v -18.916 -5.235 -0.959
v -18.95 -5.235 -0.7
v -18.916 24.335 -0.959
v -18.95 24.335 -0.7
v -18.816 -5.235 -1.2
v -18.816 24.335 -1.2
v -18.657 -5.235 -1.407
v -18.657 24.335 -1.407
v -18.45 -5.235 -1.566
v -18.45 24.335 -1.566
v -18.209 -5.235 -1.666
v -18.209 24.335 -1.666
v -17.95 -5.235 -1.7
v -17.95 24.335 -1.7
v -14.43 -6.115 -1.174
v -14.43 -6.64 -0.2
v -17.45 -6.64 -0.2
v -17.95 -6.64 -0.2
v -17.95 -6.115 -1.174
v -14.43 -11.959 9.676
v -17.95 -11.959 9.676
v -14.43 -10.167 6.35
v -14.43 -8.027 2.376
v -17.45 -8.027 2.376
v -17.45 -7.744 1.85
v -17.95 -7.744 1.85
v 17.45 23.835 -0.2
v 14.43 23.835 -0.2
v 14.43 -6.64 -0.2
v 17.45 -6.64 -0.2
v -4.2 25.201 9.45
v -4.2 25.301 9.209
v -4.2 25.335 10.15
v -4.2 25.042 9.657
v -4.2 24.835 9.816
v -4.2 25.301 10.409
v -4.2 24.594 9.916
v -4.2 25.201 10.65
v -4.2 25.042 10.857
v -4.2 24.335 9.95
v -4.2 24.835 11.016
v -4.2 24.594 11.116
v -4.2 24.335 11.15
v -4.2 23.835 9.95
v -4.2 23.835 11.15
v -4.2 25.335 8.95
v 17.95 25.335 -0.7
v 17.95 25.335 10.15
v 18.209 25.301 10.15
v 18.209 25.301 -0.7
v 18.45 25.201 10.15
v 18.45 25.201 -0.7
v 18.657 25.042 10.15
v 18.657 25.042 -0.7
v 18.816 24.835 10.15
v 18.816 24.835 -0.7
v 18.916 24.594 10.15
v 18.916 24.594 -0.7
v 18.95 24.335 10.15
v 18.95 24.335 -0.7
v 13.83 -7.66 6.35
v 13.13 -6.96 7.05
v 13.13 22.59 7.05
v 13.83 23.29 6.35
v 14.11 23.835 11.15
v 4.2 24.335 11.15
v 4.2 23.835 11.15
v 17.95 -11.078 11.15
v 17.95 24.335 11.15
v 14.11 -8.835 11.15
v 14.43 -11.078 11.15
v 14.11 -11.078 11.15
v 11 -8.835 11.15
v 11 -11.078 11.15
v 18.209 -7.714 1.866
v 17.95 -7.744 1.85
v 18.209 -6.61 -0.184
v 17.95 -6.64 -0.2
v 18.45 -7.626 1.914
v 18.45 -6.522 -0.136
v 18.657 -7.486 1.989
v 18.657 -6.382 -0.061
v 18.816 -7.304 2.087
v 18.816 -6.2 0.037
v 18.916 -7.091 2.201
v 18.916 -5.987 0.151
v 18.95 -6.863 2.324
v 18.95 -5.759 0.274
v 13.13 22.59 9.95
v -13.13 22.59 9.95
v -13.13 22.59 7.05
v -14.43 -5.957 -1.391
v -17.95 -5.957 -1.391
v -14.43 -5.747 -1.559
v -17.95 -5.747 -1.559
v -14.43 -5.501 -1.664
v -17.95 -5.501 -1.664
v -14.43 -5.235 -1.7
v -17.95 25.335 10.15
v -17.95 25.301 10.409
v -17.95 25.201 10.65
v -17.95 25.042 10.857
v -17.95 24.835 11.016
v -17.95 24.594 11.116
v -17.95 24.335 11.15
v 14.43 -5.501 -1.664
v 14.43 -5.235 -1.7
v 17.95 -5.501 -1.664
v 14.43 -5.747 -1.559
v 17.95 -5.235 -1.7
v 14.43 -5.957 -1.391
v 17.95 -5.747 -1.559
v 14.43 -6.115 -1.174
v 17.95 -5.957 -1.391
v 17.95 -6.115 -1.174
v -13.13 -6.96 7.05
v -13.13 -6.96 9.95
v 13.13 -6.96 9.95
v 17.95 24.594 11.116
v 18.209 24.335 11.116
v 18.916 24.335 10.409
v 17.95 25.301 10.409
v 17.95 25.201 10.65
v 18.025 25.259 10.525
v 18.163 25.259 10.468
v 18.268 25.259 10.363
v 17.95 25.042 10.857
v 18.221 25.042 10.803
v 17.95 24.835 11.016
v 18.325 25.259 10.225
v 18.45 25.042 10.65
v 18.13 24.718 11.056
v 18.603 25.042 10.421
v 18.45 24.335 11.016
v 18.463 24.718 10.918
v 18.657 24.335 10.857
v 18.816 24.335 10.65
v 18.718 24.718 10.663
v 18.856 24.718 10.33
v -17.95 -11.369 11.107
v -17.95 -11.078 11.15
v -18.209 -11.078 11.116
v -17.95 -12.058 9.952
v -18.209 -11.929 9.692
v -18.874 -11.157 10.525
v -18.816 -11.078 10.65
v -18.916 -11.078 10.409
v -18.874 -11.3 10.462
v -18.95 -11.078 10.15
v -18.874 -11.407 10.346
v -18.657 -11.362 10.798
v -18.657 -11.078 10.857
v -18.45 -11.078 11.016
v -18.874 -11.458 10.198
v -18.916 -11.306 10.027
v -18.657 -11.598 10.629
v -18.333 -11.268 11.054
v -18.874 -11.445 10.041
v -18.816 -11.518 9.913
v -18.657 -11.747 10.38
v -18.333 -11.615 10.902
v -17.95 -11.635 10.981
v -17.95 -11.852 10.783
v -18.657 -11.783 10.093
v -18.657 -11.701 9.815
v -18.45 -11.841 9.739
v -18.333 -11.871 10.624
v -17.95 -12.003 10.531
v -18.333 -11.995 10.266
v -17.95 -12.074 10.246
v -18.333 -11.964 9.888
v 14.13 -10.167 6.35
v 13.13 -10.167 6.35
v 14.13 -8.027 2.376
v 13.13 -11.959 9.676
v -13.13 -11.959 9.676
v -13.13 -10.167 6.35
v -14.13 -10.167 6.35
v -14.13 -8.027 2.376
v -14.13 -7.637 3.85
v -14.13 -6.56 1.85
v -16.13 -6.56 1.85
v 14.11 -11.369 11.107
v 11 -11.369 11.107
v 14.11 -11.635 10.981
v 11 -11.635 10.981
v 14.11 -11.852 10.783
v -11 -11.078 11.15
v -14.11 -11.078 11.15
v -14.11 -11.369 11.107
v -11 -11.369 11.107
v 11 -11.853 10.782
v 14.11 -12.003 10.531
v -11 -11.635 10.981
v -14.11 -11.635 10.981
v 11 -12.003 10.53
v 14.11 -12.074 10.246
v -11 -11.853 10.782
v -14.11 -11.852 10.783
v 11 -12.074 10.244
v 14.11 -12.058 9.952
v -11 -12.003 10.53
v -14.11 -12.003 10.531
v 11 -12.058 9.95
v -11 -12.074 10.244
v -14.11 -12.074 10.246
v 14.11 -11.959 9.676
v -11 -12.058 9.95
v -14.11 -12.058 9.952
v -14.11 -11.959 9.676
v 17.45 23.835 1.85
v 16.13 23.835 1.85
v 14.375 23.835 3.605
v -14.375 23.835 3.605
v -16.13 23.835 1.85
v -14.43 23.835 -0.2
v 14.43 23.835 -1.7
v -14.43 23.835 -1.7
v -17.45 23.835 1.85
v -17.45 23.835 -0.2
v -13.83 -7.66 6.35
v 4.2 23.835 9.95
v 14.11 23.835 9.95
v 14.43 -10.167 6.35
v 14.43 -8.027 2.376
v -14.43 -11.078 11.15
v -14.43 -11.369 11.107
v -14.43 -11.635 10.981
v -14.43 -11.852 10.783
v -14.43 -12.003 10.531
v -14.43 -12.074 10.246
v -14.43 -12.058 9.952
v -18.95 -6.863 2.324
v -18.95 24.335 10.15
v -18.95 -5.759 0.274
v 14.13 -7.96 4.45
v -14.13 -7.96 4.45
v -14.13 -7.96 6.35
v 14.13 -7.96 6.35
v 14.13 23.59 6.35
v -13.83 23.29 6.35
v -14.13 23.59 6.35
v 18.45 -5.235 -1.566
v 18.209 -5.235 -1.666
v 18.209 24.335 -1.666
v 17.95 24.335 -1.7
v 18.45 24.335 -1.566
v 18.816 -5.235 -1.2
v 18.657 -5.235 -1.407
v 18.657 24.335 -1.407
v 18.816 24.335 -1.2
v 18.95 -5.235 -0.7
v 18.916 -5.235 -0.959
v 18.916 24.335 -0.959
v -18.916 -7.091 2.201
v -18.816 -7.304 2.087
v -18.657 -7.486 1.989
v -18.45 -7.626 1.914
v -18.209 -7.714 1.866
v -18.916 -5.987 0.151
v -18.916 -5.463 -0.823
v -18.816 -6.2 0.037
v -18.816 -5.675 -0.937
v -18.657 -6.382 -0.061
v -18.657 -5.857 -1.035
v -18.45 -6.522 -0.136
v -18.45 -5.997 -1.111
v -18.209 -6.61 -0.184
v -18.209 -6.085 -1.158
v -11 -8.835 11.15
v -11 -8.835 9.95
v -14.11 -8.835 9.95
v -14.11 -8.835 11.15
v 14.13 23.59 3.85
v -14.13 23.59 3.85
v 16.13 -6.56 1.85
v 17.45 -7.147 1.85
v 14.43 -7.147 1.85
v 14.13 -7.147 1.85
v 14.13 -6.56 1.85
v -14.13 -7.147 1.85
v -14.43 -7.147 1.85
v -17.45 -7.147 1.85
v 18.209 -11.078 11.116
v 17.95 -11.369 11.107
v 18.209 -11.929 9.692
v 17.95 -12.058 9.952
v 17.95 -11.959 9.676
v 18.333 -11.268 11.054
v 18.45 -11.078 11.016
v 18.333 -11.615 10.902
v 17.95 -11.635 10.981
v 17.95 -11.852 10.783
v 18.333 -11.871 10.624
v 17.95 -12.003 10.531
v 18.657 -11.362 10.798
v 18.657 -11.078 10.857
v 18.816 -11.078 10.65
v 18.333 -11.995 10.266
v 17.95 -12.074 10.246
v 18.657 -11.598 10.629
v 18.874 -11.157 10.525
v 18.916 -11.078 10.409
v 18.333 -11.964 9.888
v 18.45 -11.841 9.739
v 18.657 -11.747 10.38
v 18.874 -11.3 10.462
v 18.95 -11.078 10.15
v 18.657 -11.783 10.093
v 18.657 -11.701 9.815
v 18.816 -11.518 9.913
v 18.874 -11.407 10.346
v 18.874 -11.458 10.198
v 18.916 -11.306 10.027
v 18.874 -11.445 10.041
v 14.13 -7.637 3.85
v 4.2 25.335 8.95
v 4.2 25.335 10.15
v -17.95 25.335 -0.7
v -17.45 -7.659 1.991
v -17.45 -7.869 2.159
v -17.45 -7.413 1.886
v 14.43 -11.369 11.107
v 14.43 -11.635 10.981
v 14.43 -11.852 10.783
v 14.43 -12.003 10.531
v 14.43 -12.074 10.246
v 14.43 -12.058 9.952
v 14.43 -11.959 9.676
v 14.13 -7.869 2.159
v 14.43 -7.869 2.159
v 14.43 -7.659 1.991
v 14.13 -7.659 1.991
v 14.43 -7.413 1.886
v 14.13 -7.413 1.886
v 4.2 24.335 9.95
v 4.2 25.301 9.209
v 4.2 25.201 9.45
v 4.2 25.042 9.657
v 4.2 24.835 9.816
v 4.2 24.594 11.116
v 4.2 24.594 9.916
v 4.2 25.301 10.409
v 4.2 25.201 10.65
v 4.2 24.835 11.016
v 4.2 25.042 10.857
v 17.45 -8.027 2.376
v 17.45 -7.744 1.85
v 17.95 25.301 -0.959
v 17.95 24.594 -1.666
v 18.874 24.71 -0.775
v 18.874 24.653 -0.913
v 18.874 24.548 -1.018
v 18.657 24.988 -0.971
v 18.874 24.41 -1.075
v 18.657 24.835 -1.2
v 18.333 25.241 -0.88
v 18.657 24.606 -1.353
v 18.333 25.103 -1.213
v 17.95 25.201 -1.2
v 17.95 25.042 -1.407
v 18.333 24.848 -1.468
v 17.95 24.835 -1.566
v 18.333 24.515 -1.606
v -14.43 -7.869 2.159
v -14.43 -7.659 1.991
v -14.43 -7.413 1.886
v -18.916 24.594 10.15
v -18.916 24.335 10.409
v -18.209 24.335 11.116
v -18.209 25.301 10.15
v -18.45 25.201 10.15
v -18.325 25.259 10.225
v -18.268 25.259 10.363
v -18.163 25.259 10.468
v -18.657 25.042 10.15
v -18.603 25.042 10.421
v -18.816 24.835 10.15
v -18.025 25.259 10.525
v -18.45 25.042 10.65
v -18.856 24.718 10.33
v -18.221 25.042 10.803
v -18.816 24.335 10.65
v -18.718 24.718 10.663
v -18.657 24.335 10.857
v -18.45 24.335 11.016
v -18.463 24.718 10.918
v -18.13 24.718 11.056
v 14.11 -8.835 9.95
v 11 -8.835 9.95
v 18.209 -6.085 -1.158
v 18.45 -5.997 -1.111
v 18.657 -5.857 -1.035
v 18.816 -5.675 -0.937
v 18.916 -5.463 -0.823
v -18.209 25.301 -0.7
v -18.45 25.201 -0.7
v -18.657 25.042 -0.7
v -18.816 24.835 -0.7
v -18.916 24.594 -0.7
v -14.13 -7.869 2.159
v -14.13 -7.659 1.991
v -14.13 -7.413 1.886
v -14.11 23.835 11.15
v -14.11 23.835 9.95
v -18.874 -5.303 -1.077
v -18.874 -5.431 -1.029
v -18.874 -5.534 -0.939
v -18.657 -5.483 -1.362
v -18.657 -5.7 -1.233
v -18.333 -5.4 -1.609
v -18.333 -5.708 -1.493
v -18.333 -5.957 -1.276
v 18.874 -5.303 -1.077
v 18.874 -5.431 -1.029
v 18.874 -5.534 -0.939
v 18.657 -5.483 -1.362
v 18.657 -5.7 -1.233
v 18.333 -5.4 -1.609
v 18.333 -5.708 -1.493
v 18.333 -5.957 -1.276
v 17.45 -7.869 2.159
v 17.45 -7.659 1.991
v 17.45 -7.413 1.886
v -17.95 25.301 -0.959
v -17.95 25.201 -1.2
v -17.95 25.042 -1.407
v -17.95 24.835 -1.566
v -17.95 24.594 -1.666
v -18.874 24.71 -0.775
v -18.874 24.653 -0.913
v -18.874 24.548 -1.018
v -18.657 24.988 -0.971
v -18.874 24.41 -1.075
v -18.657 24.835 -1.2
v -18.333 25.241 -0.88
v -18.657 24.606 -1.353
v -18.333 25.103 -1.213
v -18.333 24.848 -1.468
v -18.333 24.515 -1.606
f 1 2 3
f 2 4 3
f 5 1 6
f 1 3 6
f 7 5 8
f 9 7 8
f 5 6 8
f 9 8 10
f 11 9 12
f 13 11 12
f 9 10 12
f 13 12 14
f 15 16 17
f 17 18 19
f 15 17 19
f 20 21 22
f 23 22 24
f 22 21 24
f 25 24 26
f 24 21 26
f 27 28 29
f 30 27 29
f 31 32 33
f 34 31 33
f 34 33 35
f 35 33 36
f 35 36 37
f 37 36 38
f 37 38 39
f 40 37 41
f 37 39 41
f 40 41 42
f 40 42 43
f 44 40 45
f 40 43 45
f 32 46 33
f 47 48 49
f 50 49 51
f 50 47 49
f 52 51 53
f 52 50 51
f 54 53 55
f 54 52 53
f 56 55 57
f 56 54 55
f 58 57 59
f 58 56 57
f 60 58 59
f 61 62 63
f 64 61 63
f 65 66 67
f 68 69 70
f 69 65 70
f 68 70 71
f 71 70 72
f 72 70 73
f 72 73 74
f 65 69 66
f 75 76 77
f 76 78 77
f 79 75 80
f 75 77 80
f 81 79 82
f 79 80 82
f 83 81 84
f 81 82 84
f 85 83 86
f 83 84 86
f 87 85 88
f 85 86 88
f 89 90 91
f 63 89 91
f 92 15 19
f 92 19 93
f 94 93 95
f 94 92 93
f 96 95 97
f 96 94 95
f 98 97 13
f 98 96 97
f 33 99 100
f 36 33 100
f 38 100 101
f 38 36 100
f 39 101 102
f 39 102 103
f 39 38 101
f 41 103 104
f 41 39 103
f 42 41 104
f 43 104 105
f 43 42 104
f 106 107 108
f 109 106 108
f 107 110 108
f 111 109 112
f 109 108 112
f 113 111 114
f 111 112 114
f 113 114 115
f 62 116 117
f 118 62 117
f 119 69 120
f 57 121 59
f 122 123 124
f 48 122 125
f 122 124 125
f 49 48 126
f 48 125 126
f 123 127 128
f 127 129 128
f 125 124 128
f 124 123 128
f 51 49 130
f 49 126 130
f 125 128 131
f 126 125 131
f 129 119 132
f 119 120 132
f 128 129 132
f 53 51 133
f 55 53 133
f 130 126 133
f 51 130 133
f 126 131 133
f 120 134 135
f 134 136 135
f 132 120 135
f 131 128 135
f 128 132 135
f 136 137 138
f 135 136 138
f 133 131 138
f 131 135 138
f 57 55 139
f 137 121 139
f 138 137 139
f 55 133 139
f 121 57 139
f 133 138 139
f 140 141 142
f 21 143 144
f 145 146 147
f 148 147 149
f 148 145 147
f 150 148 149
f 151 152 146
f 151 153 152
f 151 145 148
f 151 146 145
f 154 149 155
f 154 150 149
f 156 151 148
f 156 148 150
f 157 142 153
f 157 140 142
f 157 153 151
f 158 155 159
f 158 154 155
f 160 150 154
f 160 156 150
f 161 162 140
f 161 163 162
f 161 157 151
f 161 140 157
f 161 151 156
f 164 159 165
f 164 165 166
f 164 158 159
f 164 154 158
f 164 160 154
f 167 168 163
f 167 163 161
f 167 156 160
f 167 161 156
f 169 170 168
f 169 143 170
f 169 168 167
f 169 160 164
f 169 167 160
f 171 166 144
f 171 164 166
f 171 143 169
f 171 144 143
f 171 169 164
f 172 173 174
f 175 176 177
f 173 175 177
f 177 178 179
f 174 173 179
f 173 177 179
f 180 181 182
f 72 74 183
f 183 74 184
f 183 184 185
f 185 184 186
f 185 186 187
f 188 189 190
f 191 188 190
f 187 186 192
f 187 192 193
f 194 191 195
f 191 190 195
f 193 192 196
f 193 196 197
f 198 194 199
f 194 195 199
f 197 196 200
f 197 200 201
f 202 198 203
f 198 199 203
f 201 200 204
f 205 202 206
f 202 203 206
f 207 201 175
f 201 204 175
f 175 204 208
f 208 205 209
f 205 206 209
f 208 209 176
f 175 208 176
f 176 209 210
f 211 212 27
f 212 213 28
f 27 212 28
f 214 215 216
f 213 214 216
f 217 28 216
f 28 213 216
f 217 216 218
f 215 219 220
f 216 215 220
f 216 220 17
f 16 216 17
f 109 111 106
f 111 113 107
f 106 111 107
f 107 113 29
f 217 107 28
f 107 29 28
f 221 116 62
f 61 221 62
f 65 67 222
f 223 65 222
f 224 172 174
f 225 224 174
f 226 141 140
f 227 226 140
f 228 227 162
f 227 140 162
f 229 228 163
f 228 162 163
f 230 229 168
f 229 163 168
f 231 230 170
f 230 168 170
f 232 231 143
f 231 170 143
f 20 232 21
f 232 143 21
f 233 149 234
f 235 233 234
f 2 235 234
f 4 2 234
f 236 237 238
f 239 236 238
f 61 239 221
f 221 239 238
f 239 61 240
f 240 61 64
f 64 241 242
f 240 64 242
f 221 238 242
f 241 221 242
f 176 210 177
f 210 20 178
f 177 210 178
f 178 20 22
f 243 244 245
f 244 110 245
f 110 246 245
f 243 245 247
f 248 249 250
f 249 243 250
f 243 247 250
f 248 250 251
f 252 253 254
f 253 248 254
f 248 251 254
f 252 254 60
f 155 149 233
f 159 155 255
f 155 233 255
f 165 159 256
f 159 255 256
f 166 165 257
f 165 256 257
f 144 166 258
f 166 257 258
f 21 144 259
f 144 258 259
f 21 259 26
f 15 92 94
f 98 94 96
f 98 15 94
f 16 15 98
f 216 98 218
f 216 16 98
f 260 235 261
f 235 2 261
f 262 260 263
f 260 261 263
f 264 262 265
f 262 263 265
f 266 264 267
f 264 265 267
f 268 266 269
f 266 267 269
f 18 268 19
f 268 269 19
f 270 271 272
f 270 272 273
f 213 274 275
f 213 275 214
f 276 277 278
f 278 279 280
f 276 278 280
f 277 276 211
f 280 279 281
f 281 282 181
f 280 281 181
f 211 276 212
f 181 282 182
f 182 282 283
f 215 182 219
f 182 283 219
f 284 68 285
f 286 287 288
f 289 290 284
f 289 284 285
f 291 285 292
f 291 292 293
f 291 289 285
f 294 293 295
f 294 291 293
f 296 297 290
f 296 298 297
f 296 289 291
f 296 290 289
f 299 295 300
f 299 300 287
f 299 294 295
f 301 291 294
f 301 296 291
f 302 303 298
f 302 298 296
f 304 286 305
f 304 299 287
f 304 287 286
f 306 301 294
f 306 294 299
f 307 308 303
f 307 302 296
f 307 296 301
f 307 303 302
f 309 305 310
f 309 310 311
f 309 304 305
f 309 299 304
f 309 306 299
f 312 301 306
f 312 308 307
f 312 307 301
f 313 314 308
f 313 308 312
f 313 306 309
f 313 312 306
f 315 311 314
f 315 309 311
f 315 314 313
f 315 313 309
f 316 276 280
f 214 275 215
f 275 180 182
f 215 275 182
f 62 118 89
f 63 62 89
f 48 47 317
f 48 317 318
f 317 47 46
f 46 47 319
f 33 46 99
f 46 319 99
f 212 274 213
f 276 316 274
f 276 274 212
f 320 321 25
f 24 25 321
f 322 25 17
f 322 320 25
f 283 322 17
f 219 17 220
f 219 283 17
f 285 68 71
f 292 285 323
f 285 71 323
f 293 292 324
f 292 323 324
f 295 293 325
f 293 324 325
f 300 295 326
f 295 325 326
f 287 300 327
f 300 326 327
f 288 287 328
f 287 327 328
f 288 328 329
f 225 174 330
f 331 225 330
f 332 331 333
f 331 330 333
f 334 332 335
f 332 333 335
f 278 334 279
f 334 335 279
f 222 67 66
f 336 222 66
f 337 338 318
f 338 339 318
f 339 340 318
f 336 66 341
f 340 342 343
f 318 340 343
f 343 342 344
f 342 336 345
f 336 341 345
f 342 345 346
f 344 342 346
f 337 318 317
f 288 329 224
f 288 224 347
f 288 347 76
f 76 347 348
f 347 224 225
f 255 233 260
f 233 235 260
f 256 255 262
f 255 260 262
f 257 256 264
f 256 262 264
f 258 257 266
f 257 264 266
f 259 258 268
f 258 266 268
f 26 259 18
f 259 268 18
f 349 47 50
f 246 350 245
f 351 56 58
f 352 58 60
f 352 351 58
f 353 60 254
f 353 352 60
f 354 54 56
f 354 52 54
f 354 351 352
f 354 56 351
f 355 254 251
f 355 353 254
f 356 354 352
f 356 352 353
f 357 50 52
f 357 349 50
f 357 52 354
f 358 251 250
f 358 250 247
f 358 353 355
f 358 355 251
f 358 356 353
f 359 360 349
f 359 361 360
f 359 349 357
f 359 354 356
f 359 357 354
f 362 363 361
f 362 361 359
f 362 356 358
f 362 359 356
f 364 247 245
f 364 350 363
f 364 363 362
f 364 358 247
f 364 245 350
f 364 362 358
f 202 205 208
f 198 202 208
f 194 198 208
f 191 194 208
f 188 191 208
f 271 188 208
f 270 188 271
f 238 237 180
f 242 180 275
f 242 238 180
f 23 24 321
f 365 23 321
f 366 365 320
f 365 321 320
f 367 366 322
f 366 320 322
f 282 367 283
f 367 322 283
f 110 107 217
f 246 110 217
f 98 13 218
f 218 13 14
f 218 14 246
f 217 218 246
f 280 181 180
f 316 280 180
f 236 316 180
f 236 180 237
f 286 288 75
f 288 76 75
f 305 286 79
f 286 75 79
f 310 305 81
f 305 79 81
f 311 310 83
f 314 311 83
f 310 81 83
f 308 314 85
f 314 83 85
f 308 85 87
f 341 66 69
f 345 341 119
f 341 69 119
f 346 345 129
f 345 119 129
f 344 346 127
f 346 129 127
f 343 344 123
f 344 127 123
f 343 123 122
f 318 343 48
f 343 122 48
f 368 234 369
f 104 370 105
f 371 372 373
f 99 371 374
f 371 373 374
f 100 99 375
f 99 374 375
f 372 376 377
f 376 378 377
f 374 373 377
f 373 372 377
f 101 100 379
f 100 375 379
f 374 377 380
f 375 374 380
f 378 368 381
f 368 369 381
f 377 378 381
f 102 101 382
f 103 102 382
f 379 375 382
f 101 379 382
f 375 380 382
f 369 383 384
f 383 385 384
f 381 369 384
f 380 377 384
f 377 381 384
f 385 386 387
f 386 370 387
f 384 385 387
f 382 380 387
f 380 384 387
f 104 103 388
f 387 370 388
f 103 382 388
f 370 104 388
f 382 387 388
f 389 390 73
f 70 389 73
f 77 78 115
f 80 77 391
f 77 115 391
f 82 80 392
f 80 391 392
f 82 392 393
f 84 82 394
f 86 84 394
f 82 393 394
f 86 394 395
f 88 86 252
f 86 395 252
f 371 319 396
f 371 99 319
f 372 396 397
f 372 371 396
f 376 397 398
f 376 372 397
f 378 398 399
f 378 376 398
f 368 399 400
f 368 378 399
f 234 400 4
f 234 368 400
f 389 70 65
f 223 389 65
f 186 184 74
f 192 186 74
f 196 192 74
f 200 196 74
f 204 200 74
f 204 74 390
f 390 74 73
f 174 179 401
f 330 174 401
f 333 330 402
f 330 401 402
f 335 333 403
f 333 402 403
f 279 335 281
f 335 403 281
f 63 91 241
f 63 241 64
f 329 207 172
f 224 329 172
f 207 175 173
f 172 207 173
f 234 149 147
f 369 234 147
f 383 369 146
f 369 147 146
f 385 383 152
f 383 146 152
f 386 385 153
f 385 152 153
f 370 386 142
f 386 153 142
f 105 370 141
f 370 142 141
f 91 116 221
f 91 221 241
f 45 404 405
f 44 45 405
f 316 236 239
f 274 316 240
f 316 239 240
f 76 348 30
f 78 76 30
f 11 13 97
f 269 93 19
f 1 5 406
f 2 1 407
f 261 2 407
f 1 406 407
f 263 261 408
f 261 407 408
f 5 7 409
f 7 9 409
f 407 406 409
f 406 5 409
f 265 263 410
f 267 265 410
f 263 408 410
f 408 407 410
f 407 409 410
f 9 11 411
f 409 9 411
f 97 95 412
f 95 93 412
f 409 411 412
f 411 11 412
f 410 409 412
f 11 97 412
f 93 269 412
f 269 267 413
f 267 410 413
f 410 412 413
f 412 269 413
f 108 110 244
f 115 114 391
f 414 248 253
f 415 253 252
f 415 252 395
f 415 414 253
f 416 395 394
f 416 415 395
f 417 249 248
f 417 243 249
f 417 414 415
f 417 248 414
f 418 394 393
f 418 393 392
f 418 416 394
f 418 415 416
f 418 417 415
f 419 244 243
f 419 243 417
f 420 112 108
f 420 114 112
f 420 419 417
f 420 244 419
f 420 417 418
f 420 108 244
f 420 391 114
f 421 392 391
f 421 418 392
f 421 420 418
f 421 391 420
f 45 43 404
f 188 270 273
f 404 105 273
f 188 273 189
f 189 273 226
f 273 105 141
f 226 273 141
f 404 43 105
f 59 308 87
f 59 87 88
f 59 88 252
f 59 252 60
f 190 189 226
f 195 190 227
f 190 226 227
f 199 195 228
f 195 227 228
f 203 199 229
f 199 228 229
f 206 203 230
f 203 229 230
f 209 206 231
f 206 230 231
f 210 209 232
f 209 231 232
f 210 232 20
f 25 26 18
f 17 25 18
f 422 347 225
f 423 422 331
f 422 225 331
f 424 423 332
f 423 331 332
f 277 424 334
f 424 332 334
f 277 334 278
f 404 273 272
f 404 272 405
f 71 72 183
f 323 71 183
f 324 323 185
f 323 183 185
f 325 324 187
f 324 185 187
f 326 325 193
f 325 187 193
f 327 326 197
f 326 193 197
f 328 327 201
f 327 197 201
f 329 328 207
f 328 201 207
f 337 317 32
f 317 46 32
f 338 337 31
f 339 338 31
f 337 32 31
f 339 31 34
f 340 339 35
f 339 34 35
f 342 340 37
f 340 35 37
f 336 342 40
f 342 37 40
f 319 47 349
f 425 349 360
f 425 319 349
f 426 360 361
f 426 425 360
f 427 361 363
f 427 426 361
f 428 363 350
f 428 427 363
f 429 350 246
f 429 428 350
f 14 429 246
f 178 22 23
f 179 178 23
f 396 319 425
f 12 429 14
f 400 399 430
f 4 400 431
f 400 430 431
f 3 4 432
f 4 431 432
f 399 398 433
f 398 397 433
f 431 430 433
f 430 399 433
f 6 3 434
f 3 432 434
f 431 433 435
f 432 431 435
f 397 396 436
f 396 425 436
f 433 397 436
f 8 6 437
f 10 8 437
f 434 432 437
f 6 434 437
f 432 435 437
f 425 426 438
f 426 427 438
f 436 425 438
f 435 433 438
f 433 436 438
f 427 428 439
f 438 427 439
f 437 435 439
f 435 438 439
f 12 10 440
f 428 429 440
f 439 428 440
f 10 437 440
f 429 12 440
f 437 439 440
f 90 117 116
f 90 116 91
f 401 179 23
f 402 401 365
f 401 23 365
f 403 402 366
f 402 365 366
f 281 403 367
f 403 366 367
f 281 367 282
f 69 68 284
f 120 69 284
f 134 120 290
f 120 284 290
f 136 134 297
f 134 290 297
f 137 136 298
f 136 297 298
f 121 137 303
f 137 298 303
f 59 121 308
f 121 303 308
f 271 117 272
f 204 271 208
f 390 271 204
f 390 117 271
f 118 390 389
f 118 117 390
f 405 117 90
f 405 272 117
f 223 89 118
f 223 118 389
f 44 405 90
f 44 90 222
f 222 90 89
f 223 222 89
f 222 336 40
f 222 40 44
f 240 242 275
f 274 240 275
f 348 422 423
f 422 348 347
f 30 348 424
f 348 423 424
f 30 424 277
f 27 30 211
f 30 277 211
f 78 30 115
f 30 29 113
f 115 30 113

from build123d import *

# Parameters (mm, degrees)
BOSS_EXTRUDE1_START    = -18.95
BOSS_EXTRUDE1_DEPTH    = 4.52
BOSS_EXTRUDE1_START_2  = -14.43
BOSS_EXTRUDE1_2_DEPTH  = 1.3
BOSS_EXTRUDE1_3_DEPTH  = 1.5
BOSS_EXTRUDE1_4_DEPTH  = 0.3
BOSS_EXTRUDE1_START_3  = -14.13
BOSS_EXTRUDE1_5_DEPTH  = 0.02
BOSS_EXTRUDE1_START_4  = 14.43
BOSS_EXTRUDE1_6_DEPTH  = 4.52
BOSS_EXTRUDE1_START_5  = 13.13
BOSS_EXTRUDE1_7_DEPTH  = 1.3
BOSS_EXTRUDE1_START_6  = 17.45
BOSS_EXTRUDE1_8_DEPTH  = 1.5
BOSS_EXTRUDE1_START_7  = 14.13
BOSS_EXTRUDE1_9_DEPTH  = 0.3
BOSS_EXTRUDE1_START_8  = 14.11
BOSS_EXTRUDE1_10_DEPTH = 0.02
BOSS_EXTRUDE2_START    = -17.45
BOSS_EXTRUDE2_DEPTH    = 34.9
FILLET1_R              = 1
SKETCH5_W              = 22
SKETCH5_H              = 3.243209614
CUT_EXTRUDE1_DEPTH     = 1.2
CHAMFER1_SIZE          = 0.7
FILLET2_R              = 1


# Read off the part's stored shape, not the designer's step: Boss-Extrude1
with BuildPart() as part:
    # Boss-Extrude1 outline → Boss-Extrude1 (new body)
    with BuildSketch(Plane.YZ.offset(BOSS_EXTRUDE1_START)):
        Polygon((-5.831945908, -1.7), (25.335, -1.7), (25.335, -0.2), (-6.639803051, -0.2), align=None)
        Polygon((-7.74387448, 1.85), (25.335, 1.85), (25.335, 11.15), (-12.752588765, 11.15), align=None)
    extrude(amount=BOSS_EXTRUDE1_DEPTH)

    # Boss-Extrude1 2 outline → Boss-Extrude1 2 (add)
    with BuildSketch(Plane.YZ.offset(BOSS_EXTRUDE1_START_2)):
        Polygon((-10.167445908, 6.35), (25.335, 6.35), (25.335, 9.95), (-12.106303051, 9.95), align=None)
    extrude(amount=BOSS_EXTRUDE1_2_DEPTH)

    # Boss-Extrude1 3 outline → Boss-Extrude1 3 (add)
    with BuildSketch(Plane.YZ.offset(BOSS_EXTRUDE1_START)):
        Polygon((-6.639803051, -0.2), (25.335, -0.2), (25.335, 1.85), (-7.74387448, 1.85), align=None)
    extrude(amount=BOSS_EXTRUDE1_3_DEPTH)

    # Boss-Extrude1 4 outline → Boss-Extrude1 4 (add)
    with BuildSketch(Plane.YZ.offset(BOSS_EXTRUDE1_START_2)):
        Polygon((-7.74387448, 1.85), (25.335, 1.85), (25.335, 6.35), (-10.167445908, 6.35), align=None)
        Polygon((-12.106303051, 9.95), (25.335, 9.95), (25.335, 11.15), (-12.752588765, 11.15), align=None)
    extrude(amount=BOSS_EXTRUDE1_4_DEPTH)

    # Boss-Extrude1 5 outline → Boss-Extrude1 5 (add)
    with BuildSketch(Plane.YZ.offset(BOSS_EXTRUDE1_START_3)):
        Polygon((-12.106303051, 9.95), (25.335, 9.95), (25.335, 11.15), (-12.752588765, 11.15), align=None)
    extrude(amount=BOSS_EXTRUDE1_5_DEPTH)



with BuildPart() as body_2:
    # Boss-Extrude1 6 outline → Boss-Extrude1 6 (new body)
    with BuildSketch(Plane.YZ.offset(BOSS_EXTRUDE1_START_4)):
        Polygon((-5.831945908, -1.7), (25.335, -1.7), (25.335, -0.2), (-6.639803051, -0.2), align=None)
        Polygon((-7.74387448, 1.85), (25.335, 1.85), (25.335, 11.15), (-12.752588765, 11.15), align=None)
    extrude(amount=BOSS_EXTRUDE1_6_DEPTH)

    # Boss-Extrude1 7 outline → Boss-Extrude1 7 (add)
    with BuildSketch(Plane.YZ.offset(BOSS_EXTRUDE1_START_5)):
        Polygon((-10.167445908, 6.35), (25.335, 6.35), (25.335, 9.95), (-12.106303051, 9.95), align=None)
    extrude(amount=BOSS_EXTRUDE1_7_DEPTH)

    # Boss-Extrude1 8 outline → Boss-Extrude1 8 (add)
    with BuildSketch(Plane.YZ.offset(BOSS_EXTRUDE1_START_6)):
        Polygon((-6.639803051, -0.2), (25.335, -0.2), (25.335, 1.85), (-7.74387448, 1.85), align=None)
    extrude(amount=BOSS_EXTRUDE1_8_DEPTH)

    # Boss-Extrude1 9 outline → Boss-Extrude1 9 (add)
    with BuildSketch(Plane.YZ.offset(BOSS_EXTRUDE1_START_7)):
        Polygon((-7.74387448, 1.85), (25.335, 1.85), (25.335, 6.35), (-10.167445908, 6.35), align=None)
        Polygon((-12.106303051, 9.95), (25.335, 9.95), (25.335, 11.15), (-12.752588765, 11.15), align=None)
    extrude(amount=BOSS_EXTRUDE1_9_DEPTH)

    # Boss-Extrude1 10 outline → Boss-Extrude1 10 (add)
    with BuildSketch(Plane.YZ.offset(BOSS_EXTRUDE1_START_8)):
        Polygon((-12.106303051, 9.95), (25.335, 9.95), (25.335, 11.15), (-12.752588765, 11.15), align=None)
    extrude(amount=BOSS_EXTRUDE1_10_DEPTH)


with BuildPart() as part_1:
    add(part.part)

    add(body_2.part)  # Boss-Extrude2 merges body 2
    # Sketch4 → Boss-Extrude2 (add)
    with BuildSketch(Plane(origin=(0, 0, 0), x_dir=(0, 0, -1), z_dir=(1, 0, 0)).offset(BOSS_EXTRUDE2_START)):
        Polygon((1.7, 25.335), (-11.15, 25.335), (-11.15, 23.835), (-9.95, 23.835), (-9.95, 22.59), (-6.35, 22.59), (-6.35, 23.59), (-1.85, 23.59), (-1.85, 23.835), (1.7, 23.835), align=None)
        Polygon((-11.15, -8.835), (-11.15, -12.752588765), (-1.85, -7.74387448), (-1.85, -6.559714286), (-4.45, -7.96), (-6.35, -7.96), (-6.35, -6.96), (-9.95, -6.96), (-9.95, -8.835), align=None)
    extrude(amount=BOSS_EXTRUDE2_DEPTH)

    # Fillet1
    # the kernel refuses this fillet: 1 mm, written as the material it takes off along each edge
    with BuildSketch(Plane(origin=(-14.13, -7.74387448, 1.85), x_dir=(0, -0.47417482524162685, 0.8804307099977104), z_dir=(1, 0, 0))) as fillet1_piece_1:
        with BuildLine():
            CenterArc((FILLET1_R * 0.597236294449, -FILLET1_R), FILLET1_R, 90, 61.694363428)
            Line((-FILLET1_R * 0.283194415548, -FILLET1_R * 0.525825174758), (0, 0))
            Line((0, 0), (FILLET1_R * 0.597236294449, 0))
        make_face()
    extrude(amount=28.26, mode=Mode.SUBTRACT)
    with BuildSketch(Plane(origin=(-14.11, -12.752588765, 11.15), x_dir=(0, 0.47417482524162624, -0.8804307099977108), z_dir=(1, 0, 0))) as fillet1_piece_2:
        with BuildLine():
            CenterArc((FILLET1_R * 1.67437915159, FILLET1_R), FILLET1_R, 151.694363428, 118.305636572)
            Line((FILLET1_R * 0.793948441594, FILLET1_R * 1.47417482524), (0, 0))
            Line((0, 0), (FILLET1_R * 1.67437915159, 0))
        make_face()
    extrude(amount=28.22, mode=Mode.SUBTRACT)
    with BuildSketch(Plane(origin=(-14.43, -12.752588765, 11.15), x_dir=(0, 0.4741748250791318, -0.8804307100852257), z_dir=(1, 0, 0)), Plane(origin=(14.11, -12.752588765, 11.15), x_dir=(0, 0.4741748250791318, -0.8804307100852257), z_dir=(1, 0, 0))) as fillet1_piece_3:
        with BuildLine():
            CenterArc((FILLET1_R * 1.67437915124, FILLET1_R), FILLET1_R, 151.694363439, 118.305636561)
            Line((FILLET1_R * 0.793948441156, FILLET1_R * 1.47417482508), (0, 0))
            Line((0, 0), (FILLET1_R * 1.67437915124, 0))
        make_face()
    extrude(amount=0.32, mode=Mode.SUBTRACT)
    with BuildSketch(Plane(origin=(14.43, -12.752588765, 11.15), x_dir=(0, 0.4741748251892074, -0.8804307100259421), z_dir=(1, 0, 0)), Plane(origin=(-23.135947879, -12.752588765, 11.15), x_dir=(0, 0.4741748251892074, -0.8804307100259421), z_dir=(1, 0, 0))) as fillet1_piece_4:
        with BuildLine():
            CenterArc((FILLET1_R * 1.67437915148, FILLET1_R), FILLET1_R, 151.694363432, 118.305636568)
            Line((FILLET1_R * 0.793948441453, FILLET1_R * 1.47417482519), (0, 0))
            Line((0, 0), (FILLET1_R * 1.67437915148, 0))
        make_face()
    extrude(amount=8.705947879, mode=Mode.SUBTRACT)
    with BuildSketch(Plane(origin=(-14.43, -7.74387448, 1.85), x_dir=(0, -0.47417482515496245, 0.8804307100443854), z_dir=(1, 0, 0)), Plane(origin=(14.13, -7.74387448, 1.85), x_dir=(0, -0.47417482515496245, 0.8804307100443854), z_dir=(1, 0, 0))) as fillet1_piece_5:
        with BuildLine():
            CenterArc((FILLET1_R * 0.597236294516, -FILLET1_R), FILLET1_R, 90, 61.694363434)
            Line((-FILLET1_R * 0.283194415528, -FILLET1_R * 0.525825174845), (0, 0))
            Line((0, 0), (FILLET1_R * 0.597236294516, 0))
        make_face()
    extrude(amount=0.3, mode=Mode.SUBTRACT)
    with BuildSketch(Plane(origin=(14.43, -7.74387448, 1.85), x_dir=(0, 1, 0), z_dir=(1, 0, 0))) as fillet1_piece_6:
        with BuildLine():
            CenterArc((FILLET1_R * 0.59723629449, FILLET1_R), FILLET1_R, 208.305636568, 61.694363432)
            Line((-FILLET1_R * 0.283194415536, FILLET1_R * 0.525825174811), (0, 0))
            Line((0, 0), (FILLET1_R * 0.59723629449, 0))
        make_face()
    extrude(amount=3.02, mode=Mode.SUBTRACT)
    with BuildSketch(Plane(origin=(-17.45, -7.74387448, 1.85), x_dir=(0, -0.4741748251892074, 0.8804307100259422), z_dir=(1, 0, 0))) as fillet1_piece_7:
        with BuildLine():
            CenterArc((FILLET1_R * 0.59723629449, -FILLET1_R), FILLET1_R, 90, 61.694363432)
            Line((-FILLET1_R * 0.283194415536, -FILLET1_R * 0.525825174811), (0, 0))
            Line((0, 0), (FILLET1_R * 0.59723629449, 0))
        make_face()
    extrude(amount=3.02, mode=Mode.SUBTRACT)

    # Sketch5 → Cut-Extrude1 (cut)
    with BuildSketch(Plane.XY.offset(11.15)):
        Polygon((4.2, 23.635), (4.2, 24.135), (4.2, 25.335), (-4.2, 25.335), (-4.2, 24.135), (-4.2, 23.635), align=None)
        with Locations((0, -10.456604807)):
            Rectangle(SKETCH5_W, SKETCH5_H)
    extrude(amount=-CUT_EXTRUDE1_DEPTH, mode=Mode.SUBTRACT)

    # Chamfer1
    chamfer1_edges = [part_1.edges().sort_by_distance(p)[0] for p in [
        (0, 22.59, 6.35),
        (13.13, 7.815, 6.35),
        (0, -6.96, 6.35),
        (-13.13, 7.815, 6.35),
    ]]
    chamfer(chamfer1_edges, length=CHAMFER1_SIZE)

    # Chamfer2
    # the kernel refuses this chamfer: 2 mm, written as the material it takes off along each edge
    with BuildSketch(Plane(origin=(-14.13, 23.59, 1.85), x_dir=(0, -0.02749587661058563, 0.9996219169112968), z_dir=(1, 0, 0))) as chamfer2_piece_1_section:
        with BuildLine():
            Line((2.05734639, 0), (-0.11309431, -2.054235587))
            Line((-0.11309431, -2.054235587), (-0.153079186, -2.053135752))
            ThreePointArc((-0.153079186, -2.053135752), (-0.068258454, -1.026795659), (-0.039984877, 0.001099835))
            Line((-0.039984877, 0.001099835), (0.001099835, 0.039984877))
            ThreePointArc((0.001099835, 0.039984877), (1.028995329, 0.011711299), (2.058446225, 0.039984877))
            Line((2.058446225, 0.039984877), (2.05734639, 0))
        make_face()
    chamfer2_piece_1 = extrude(amount=28.26, mode=Mode.PRIVATE)
    chamfer2_piece_1 = split(chamfer2_piece_1, bisect_by=Plane(origin=(0, 23.835, 2.821035837), z_dir=(0, -1, 0)), keep=Keep.TOP, mode=Mode.PRIVATE)
    add(chamfer2_piece_1, mode=Mode.SUBTRACT)
    with BuildSketch(Plane(origin=(14.13, -11.703080262, 1.85), x_dir=(-0.027495876610586494, 0, 0.9996219169112968), z_dir=(0, 1, 0))) as chamfer2_piece_2_section:
        with BuildLine():
            Line((2.05734639, 0), (-0.11309431, 2.054235587))
            Line((-0.11309431, 2.054235587), (-0.153079186, 2.053135752))
            ThreePointArc((-0.153079186, 2.053135752), (-0.068258454, 1.026795659), (-0.039984877, -0.001099835))
            Line((-0.039984877, -0.001099835), (0.001099835, -0.039984877))
            ThreePointArc((0.001099835, -0.039984877), (1.028995329, -0.011711299), (2.058446225, -0.039984877))
            Line((2.058446225, -0.039984877), (2.05734639, 0))
        make_face()
    chamfer2_piece_2 = extrude(amount=35.293080262, mode=Mode.PRIVATE)
    chamfer2_piece_2 = split(chamfer2_piece_2, bisect_by=Plane(origin=(14.787189765, -3.487699586, -3.854006073), z_dir=(0, 0.880430709997711, 0.4741748252416259)), keep=Keep.TOP, mode=Mode.PRIVATE)
    add(chamfer2_piece_2, mode=Mode.SUBTRACT)
    with BuildSketch(Plane(origin=(-14.13, -11.703080262, 1.85), x_dir=(0.027495876610586494, 0, 0.9996219169112968), z_dir=(0, 1, 0))) as chamfer2_piece_3_section:
        with BuildLine():
            Line((2.05734639, 0), (-0.11309431, -2.054235587))
            Line((-0.11309431, -2.054235587), (-0.153079186, -2.053135752))
            ThreePointArc((-0.153079186, -2.053135752), (-0.068258454, -1.026795659), (-0.039984877, 0.001099835))
            Line((-0.039984877, 0.001099835), (0.001099835, 0.039984877))
            ThreePointArc((0.001099835, 0.039984877), (1.028995329, 0.011711299), (2.058446225, 0.039984877))
            Line((2.058446225, 0.039984877), (2.05734639, 0))
        make_face()
    chamfer2_piece_3 = extrude(amount=35.293080262, mode=Mode.PRIVATE)
    chamfer2_piece_3 = split(chamfer2_piece_3, bisect_by=Plane(origin=(-14.787189765, -3.487699586, -3.854006073), z_dir=(0, 0.880430709997711, 0.4741748252416259)), keep=Keep.TOP, mode=Mode.PRIVATE)
    add(chamfer2_piece_3, mode=Mode.SUBTRACT)
    with BuildSketch(Plane(origin=(-19.273365976, 23.59, 1.85), x_dir=(0, -0.02749587661058563, 0.9996219169112968), z_dir=(1, 0, 0))) as chamfer2_piece_4a_section:
        with BuildLine():
            Line((2.05734639, 0), (-0.11309431, -2.054235587))
            Line((-0.11309431, -2.054235587), (-0.153079186, -2.053135752))
            ThreePointArc((-0.153079186, -2.053135752), (-0.068258454, -1.026795659), (-0.039984877, 0.001099835))
            Line((-0.039984877, 0.001099835), (0.001099835, 0.039984877))
            ThreePointArc((0.001099835, 0.039984877), (1.028995329, 0.011711299), (2.058446225, 0.039984877))
            Line((2.058446225, 0.039984877), (2.05734639, 0))
        make_face()
    chamfer2_piece_4a = extrude(amount=33.403365976, mode=Mode.PRIVATE)
    chamfer2_piece_4a = split(chamfer2_piece_4a, bisect_by=Plane(origin=(-14.13, 23.683647422, 2.821035837), z_dir=(-1, 0, 0)), keep=Keep.TOP, mode=Mode.PRIVATE)
    chamfer2_piece_4a = split(chamfer2_piece_4a, bisect_by=Plane(origin=(-17.45, 23.683647422, 2.821035837), z_dir=(1, 0, 0)), keep=Keep.TOP, mode=Mode.PRIVATE)
    chamfer2_piece_4a = split(chamfer2_piece_4a, bisect_by=Plane(origin=(-15.79, 23.835, 2.821035837), z_dir=(0, -1, 0)), keep=Keep.TOP, mode=Mode.PRIVATE)
    with BuildSketch(Plane(origin=(-14.13, -11.703080262, 1.85), x_dir=(0.027495876610586494, 0, 0.9996219169112968), z_dir=(0, 1, 0))) as chamfer2_piece_4b_section:
        with BuildLine():
            Line((2.05734639, 0), (-0.11309431, -2.054235587))
            Line((-0.11309431, -2.054235587), (-0.153079186, -2.053135752))
            ThreePointArc((-0.153079186, -2.053135752), (-0.068258454, -1.026795659), (-0.039984877, 0.001099835))
            Line((-0.039984877, 0.001099835), (0.001099835, 0.039984877))
            ThreePointArc((0.001099835, 0.039984877), (1.028995329, 0.011711299), (2.058446225, 0.039984877))
            Line((2.058446225, 0.039984877), (2.05734639, 0))
        make_face()
    chamfer2_piece_4b = extrude(amount=40.436446238, mode=Mode.PRIVATE)
    chamfer2_piece_4b = split(chamfer2_piece_4b, bisect_by=Plane(origin=(-14.789587254, 23.59, 2.509587254), z_dir=(0, 1, 0)), keep=Keep.TOP, mode=Mode.PRIVATE)
    chamfer2_piece_4b = split(chamfer2_piece_4b, bisect_by=Plane(origin=(-14.789587254, 23.835, 2.509587254), z_dir=(0, -1, 0)), keep=Keep.TOP, mode=Mode.PRIVATE)
    chamfer2_piece_4 = chamfer2_piece_4a & chamfer2_piece_4b
    add(chamfer2_piece_4, mode=Mode.SUBTRACT)
    with BuildSketch(Plane(origin=(-14.13, 23.59, 1.85), x_dir=(0, -0.02749587661058563, 0.9996219169112968), z_dir=(1, 0, 0))) as chamfer2_piece_5a_section:
        with BuildLine():
            Line((2.05734639, 0), (-0.11309431, -2.054235587))
            Line((-0.11309431, -2.054235587), (-0.153079186, -2.053135752))
            ThreePointArc((-0.153079186, -2.053135752), (-0.068258454, -1.026795659), (-0.039984877, 0.001099835))
            Line((-0.039984877, 0.001099835), (0.001099835, 0.039984877))
            ThreePointArc((0.001099835, 0.039984877), (1.028995329, 0.011711299), (2.058446225, 0.039984877))
            Line((2.058446225, 0.039984877), (2.05734639, 0))
        make_face()
    chamfer2_piece_5a = extrude(amount=33.403365976, mode=Mode.PRIVATE)
    chamfer2_piece_5a = split(chamfer2_piece_5a, bisect_by=Plane(origin=(14.13, 23.683647422, 2.821035837), z_dir=(1, 0, 0)), keep=Keep.TOP, mode=Mode.PRIVATE)
    chamfer2_piece_5a = split(chamfer2_piece_5a, bisect_by=Plane(origin=(15.79, 23.835, 2.821035837), z_dir=(0, -1, 0)), keep=Keep.TOP, mode=Mode.PRIVATE)
    chamfer2_piece_5a = split(chamfer2_piece_5a, bisect_by=Plane(origin=(17.45, 23.683647422, 2.821035837), z_dir=(-1, 0, 0)), keep=Keep.TOP, mode=Mode.PRIVATE)
    with BuildSketch(Plane(origin=(14.13, -11.703080262, 1.85), x_dir=(-0.027495876610586494, 0, 0.9996219169112968), z_dir=(0, 1, 0))) as chamfer2_piece_5b_section:
        with BuildLine():
            Line((2.05734639, 0), (-0.11309431, 2.054235587))
            Line((-0.11309431, 2.054235587), (-0.153079186, 2.053135752))
            ThreePointArc((-0.153079186, 2.053135752), (-0.068258454, 1.026795659), (-0.039984877, -0.001099835))
            Line((-0.039984877, -0.001099835), (0.001099835, -0.039984877))
            ThreePointArc((0.001099835, -0.039984877), (1.028995329, -0.011711299), (2.058446225, -0.039984877))
            Line((2.058446225, -0.039984877), (2.05734639, 0))
        make_face()
    chamfer2_piece_5b = extrude(amount=40.436446238, mode=Mode.PRIVATE)
    chamfer2_piece_5b = split(chamfer2_piece_5b, bisect_by=Plane(origin=(14.789587254, 23.59, 2.509587254), z_dir=(0, 1, 0)), keep=Keep.TOP, mode=Mode.PRIVATE)
    chamfer2_piece_5b = split(chamfer2_piece_5b, bisect_by=Plane(origin=(14.789587254, 23.835, 2.509587254), z_dir=(0, -1, 0)), keep=Keep.TOP, mode=Mode.PRIVATE)
    chamfer2_piece_5 = chamfer2_piece_5a & chamfer2_piece_5b
    add(chamfer2_piece_5, mode=Mode.SUBTRACT)

    # Fillet2
    fillet2_edges = [part_1.edges().sort_by_distance(p)[0] for p in [
        (18.95, -9.851257402, 5.762912587),
        (16.69, -5.831945908, -1.7),
        (-18.95, 7.128395193, 11.15),
        (-18.95, -9.851257402, 5.762912587),
        (-18.95, -11.936747564, 10.662750024),
        (18.95, 7.128395193, 11.15),
        (18.95, -11.936747564, 10.662750024),
        (11.575, 25.335, 11.15),
        (-16.69, -5.831945908, -1.7),
        (0, 25.335, 9.95),
        (0, 25.335, -1.7),
        (-18.95, 25.335, 4.725),
        (-11.575, 25.335, 11.15),
        (18.95, 25.335, 4.725),
        (18.95, 9.751527046, -1.7),
        (-18.95, 9.751527046, -1.7),
    ]]
    fillet(fillet2_edges, radius=FILLET2_R)


solid = part_1.part
